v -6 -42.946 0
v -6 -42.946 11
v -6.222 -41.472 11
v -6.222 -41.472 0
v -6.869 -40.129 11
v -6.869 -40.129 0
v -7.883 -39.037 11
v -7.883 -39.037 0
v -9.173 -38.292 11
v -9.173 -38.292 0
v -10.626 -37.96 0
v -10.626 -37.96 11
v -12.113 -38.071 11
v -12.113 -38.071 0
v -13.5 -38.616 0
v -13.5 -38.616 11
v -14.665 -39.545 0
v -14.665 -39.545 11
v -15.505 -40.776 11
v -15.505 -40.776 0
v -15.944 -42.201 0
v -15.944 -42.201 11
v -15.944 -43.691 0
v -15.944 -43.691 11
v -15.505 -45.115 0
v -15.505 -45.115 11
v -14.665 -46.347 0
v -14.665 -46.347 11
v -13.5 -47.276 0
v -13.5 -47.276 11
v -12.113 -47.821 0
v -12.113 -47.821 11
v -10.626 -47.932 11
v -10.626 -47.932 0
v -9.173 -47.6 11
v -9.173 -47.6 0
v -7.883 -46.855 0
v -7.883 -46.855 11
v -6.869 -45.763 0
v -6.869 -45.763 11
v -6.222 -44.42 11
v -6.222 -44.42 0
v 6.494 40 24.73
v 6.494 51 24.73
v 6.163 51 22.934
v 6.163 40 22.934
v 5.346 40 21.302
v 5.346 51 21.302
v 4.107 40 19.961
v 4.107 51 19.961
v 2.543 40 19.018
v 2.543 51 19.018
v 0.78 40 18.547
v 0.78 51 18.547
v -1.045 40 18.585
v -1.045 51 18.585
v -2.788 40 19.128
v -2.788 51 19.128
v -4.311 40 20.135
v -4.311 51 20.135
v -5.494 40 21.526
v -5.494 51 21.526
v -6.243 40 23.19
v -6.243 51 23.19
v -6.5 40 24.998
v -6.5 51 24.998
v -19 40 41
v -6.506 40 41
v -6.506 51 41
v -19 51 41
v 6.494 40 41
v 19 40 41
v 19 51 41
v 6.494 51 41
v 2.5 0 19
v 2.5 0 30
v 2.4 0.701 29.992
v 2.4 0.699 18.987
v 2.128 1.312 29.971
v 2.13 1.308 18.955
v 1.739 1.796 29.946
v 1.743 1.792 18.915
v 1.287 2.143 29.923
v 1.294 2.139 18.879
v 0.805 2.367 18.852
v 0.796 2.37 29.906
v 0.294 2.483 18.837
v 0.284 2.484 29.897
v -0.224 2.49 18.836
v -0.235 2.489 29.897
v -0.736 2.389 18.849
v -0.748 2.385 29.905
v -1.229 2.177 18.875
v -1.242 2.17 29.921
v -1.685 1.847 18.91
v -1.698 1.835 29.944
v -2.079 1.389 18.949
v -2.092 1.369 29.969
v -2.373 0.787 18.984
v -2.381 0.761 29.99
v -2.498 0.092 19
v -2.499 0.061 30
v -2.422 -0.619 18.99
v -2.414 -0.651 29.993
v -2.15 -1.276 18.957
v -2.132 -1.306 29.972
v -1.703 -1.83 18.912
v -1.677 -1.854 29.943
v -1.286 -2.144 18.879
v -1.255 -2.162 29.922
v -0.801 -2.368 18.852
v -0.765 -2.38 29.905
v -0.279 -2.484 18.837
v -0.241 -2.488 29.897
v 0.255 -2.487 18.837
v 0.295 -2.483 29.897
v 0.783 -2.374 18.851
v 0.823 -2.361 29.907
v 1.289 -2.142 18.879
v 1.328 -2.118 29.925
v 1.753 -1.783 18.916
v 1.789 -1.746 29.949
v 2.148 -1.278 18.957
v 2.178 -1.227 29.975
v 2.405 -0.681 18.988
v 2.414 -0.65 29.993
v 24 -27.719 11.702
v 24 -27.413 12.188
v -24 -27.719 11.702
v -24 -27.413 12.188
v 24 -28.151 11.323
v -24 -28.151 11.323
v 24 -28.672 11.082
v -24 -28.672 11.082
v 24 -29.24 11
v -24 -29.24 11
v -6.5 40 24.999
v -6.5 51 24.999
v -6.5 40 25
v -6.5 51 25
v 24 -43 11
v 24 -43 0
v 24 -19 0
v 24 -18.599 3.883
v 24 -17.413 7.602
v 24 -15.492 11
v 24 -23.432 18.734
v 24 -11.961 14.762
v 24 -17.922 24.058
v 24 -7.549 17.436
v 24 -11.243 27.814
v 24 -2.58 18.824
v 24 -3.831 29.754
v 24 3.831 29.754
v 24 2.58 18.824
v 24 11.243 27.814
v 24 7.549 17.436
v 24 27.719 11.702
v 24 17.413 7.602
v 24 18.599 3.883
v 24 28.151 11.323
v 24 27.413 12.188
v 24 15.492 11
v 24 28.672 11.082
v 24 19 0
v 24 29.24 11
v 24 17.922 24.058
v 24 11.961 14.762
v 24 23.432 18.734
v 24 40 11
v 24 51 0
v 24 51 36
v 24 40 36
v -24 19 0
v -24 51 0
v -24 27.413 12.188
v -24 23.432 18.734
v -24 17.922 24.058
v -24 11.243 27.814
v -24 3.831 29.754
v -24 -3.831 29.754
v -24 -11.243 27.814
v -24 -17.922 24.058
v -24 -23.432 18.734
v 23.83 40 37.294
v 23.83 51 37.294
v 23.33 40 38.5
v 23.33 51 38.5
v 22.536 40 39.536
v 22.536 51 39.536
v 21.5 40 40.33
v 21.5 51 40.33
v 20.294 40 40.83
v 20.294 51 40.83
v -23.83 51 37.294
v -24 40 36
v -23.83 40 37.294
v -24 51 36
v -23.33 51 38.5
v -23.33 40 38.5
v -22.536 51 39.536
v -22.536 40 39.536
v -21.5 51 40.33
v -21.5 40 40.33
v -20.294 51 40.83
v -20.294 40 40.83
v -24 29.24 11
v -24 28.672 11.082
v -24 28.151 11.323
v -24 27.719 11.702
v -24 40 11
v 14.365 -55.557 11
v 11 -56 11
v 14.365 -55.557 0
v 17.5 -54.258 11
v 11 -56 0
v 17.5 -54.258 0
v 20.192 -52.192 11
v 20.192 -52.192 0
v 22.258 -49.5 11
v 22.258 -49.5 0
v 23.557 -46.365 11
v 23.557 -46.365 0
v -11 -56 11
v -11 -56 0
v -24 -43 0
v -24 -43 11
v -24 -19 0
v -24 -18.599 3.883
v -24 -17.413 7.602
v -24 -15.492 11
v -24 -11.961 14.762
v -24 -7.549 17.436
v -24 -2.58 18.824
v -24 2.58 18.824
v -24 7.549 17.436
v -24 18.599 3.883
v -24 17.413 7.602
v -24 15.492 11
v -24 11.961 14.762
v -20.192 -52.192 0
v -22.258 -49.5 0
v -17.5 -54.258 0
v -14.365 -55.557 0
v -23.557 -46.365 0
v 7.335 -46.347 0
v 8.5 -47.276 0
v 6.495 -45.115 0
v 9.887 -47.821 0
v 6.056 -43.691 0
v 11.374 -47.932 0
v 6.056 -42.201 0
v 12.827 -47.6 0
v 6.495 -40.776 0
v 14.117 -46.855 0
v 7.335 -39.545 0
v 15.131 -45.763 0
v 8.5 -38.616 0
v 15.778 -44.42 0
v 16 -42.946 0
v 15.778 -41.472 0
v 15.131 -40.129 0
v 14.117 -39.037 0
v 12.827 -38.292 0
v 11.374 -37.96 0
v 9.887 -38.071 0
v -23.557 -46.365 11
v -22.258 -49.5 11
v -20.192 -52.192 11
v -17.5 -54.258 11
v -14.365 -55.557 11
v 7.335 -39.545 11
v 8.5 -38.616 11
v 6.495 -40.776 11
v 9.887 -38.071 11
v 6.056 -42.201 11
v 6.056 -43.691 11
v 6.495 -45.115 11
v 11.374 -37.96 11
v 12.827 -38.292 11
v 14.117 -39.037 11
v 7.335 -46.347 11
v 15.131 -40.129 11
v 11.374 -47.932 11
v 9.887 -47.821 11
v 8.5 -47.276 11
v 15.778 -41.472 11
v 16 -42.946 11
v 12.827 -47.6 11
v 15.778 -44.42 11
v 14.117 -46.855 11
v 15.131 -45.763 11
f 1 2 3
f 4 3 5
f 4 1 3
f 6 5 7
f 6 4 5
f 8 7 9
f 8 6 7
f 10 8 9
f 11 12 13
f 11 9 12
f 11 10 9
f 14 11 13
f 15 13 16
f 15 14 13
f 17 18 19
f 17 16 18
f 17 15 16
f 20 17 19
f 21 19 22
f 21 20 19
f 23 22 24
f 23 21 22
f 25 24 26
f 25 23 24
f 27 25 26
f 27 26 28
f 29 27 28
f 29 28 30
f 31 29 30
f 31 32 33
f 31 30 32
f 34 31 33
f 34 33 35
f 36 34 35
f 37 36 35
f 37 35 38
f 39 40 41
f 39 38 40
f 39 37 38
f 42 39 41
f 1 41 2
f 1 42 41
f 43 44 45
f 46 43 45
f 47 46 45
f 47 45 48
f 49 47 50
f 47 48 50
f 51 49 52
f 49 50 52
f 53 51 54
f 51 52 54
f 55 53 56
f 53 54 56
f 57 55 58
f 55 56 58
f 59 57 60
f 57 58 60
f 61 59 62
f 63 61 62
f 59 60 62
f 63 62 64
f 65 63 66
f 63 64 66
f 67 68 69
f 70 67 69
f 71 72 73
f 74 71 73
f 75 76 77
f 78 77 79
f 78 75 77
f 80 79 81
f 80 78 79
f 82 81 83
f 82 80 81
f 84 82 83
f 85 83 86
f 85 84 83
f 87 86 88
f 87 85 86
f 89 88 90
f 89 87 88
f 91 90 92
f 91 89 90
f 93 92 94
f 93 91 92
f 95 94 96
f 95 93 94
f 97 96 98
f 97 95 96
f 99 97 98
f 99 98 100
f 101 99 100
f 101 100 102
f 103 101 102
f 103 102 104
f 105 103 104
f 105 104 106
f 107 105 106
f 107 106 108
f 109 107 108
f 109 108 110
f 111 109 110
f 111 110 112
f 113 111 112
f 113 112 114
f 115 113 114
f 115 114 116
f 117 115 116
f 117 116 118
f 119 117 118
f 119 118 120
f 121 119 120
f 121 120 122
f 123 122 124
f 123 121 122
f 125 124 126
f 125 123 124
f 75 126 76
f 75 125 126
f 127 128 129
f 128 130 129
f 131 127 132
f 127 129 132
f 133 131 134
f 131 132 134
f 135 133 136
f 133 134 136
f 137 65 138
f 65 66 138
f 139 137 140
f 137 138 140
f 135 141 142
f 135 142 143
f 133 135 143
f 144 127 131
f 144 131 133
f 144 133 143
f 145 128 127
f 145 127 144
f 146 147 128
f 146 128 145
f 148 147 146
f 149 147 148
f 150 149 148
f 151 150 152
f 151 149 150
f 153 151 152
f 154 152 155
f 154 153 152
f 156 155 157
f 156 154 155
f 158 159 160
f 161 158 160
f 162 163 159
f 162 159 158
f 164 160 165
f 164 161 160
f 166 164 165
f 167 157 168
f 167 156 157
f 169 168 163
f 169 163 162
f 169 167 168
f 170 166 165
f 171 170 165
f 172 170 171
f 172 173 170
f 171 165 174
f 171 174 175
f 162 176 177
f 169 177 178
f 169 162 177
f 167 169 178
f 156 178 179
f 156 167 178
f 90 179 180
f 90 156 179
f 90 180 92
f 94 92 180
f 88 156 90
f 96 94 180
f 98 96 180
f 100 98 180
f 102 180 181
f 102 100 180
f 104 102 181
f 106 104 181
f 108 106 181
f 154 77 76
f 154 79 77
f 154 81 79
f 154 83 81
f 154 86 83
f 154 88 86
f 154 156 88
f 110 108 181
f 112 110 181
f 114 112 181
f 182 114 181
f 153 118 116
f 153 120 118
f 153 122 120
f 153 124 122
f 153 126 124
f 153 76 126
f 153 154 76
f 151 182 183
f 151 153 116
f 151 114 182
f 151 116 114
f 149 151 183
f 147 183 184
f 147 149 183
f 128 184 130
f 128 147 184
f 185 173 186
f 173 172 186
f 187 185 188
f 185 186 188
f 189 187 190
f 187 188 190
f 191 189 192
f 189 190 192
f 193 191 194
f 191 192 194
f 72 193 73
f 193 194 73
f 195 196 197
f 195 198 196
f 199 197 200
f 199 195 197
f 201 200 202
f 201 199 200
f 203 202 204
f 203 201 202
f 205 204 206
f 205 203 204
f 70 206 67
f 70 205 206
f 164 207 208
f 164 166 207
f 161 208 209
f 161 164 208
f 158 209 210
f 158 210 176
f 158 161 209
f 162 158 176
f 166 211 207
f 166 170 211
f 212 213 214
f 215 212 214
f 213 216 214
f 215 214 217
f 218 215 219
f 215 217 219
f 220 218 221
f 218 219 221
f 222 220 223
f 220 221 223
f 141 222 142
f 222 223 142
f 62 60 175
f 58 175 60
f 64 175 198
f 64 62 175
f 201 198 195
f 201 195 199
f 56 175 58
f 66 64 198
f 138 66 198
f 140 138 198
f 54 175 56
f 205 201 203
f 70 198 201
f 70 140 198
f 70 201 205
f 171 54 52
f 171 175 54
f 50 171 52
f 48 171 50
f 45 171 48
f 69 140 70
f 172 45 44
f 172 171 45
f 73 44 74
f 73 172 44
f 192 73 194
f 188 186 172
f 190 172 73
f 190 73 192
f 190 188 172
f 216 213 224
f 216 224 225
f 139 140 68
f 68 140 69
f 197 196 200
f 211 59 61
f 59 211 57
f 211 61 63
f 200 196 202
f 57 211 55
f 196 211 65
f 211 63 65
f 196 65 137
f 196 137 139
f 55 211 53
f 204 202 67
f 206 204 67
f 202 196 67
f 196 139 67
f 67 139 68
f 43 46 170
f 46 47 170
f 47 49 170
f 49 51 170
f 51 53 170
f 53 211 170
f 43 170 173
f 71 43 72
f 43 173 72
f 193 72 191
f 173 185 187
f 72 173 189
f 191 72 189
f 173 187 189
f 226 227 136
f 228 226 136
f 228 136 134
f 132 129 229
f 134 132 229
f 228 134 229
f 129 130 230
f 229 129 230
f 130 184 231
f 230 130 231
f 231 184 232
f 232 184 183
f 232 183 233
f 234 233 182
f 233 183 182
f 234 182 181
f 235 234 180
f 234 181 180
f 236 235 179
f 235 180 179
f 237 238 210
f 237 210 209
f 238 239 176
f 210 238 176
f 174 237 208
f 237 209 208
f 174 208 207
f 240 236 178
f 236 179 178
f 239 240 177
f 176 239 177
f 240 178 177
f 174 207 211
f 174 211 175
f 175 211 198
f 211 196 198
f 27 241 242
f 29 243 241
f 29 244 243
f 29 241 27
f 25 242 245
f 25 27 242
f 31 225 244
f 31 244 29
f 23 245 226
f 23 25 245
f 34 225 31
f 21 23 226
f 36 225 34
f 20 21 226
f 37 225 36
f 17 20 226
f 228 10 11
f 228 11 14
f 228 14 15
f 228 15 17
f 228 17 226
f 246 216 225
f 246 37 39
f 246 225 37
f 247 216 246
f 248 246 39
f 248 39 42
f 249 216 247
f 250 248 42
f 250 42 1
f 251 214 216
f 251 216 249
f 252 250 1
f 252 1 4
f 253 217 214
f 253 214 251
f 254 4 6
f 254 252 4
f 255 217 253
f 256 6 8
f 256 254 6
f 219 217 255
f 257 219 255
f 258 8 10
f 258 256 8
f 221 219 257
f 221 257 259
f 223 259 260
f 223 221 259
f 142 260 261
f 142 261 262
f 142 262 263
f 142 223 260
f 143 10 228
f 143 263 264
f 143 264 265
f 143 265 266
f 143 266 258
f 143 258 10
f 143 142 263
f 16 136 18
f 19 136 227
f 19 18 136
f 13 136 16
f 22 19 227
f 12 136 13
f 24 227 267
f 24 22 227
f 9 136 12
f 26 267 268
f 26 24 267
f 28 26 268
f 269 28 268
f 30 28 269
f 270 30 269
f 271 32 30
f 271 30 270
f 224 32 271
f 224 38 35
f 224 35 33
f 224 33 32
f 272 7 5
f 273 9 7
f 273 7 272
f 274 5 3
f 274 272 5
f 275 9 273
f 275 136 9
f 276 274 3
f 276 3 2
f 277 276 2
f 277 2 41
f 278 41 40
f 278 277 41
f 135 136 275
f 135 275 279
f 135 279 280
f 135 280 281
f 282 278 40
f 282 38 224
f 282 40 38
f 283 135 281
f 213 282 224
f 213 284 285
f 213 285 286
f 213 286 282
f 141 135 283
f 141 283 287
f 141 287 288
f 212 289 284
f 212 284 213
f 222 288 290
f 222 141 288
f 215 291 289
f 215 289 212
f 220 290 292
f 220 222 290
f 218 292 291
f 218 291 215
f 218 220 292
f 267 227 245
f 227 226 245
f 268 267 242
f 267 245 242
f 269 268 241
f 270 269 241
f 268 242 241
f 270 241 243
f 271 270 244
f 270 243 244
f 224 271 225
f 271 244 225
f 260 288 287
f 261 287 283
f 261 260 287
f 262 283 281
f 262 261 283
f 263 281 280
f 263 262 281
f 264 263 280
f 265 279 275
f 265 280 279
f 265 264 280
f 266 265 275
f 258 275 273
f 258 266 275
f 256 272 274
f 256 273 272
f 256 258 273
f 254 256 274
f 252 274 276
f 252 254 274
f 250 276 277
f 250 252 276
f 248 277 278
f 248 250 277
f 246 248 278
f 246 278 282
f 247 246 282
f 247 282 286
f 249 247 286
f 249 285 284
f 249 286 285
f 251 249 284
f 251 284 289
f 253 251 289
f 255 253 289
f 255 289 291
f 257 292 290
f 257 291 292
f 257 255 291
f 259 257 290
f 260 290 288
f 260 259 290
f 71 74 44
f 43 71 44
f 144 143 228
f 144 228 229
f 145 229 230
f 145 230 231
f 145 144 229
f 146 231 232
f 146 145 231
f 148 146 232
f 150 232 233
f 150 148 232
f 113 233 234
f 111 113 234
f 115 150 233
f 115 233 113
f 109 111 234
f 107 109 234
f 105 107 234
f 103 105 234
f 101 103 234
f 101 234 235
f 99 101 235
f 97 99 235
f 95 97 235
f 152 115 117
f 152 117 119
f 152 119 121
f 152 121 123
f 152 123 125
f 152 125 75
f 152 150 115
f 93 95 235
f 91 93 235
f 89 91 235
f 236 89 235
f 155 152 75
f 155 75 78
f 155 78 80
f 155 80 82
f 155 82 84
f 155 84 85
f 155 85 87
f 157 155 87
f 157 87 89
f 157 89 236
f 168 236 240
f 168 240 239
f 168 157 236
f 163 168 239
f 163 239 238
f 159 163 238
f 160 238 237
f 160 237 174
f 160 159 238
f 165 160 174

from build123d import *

# Parameters (mm, degrees)
F0_W     = 11
F0_H     = 30
F1_DEPTH = 24
F3_DEPTH = 11
F4_R     = 5
F4_R_2   = 2.5
F5_DEPTH = 41.001
F6_R     = 13
F7_R     = 5
F8_R     = 2


# Not quite as in the source:
# - ends of sketch curves that miss each other by under 0.0002 mm in the source are joined


with BuildPart() as f1:
    # F0 (on Right) → F1 (new body, symmetric)
    with BuildSketch(Plane.YZ):
        with BuildLine():
            Line((-56, 0), (-30, 0))
            ThreePointArc((-30, 0), (-29.4730143031, 5.5983415304), (-27.9105714739, 11))
            Line((-27.9105714739, 11), (-56, 11))
            Line((-56, 11), (-56, 0))
        make_face()
        with BuildLine():
            Line((-30, 0), (-19, 0))
            ThreePointArc((-19, 0), (-18.1017503893, 5.7729223833), (-15.4919333848, 11))
            Line((-15.4919333848, 11), (-27.9105714739, 11))
            ThreePointArc((-27.9105714739, 11), (-29.4730143031, 5.5983415304), (-30, 0))
        make_face()
        with BuildLine():
            ThreePointArc((-15.4919333848, 11), (0, 19), (15.4919333848, 11))
            Line((15.4919333848, 11), (27.9105714739, 11))
            ThreePointArc((27.9105714739, 11), (0, 30), (-27.9105714739, 11))
            Line((-27.9105714739, 11), (-15.4919333848, 11))
        make_face()
        with BuildLine():
            ThreePointArc((15.4919333848, 11), (18.1017503893, 5.7729223833), (19, 0))
            Line((19, 0), (30, 0))
            ThreePointArc((30, 0), (29.4730143031, 5.5983415304), (27.9105714739, 11))
            Line((27.9105714739, 11), (15.4919333848, 11))
        make_face()
        with BuildLine():
            ThreePointArc((27.9105714739, 11), (29.4730143031, 5.5983415304), (30, 0))
            Line((30, 0), (51, 0))
            Line((51, 0), (51, 11))
            Line((51, 11), (40, 11))
            Line((40, 11), (27.9105714739, 11))
        make_face()
        with Locations((45.5, 26)):
            Rectangle(F0_W, F0_H)
    extrude(amount=F1_DEPTH, both=True)

    # F2 (on face) → F3 (cut, through all)
    with BuildSketch(Plane(origin=(0, 51, 0), x_dir=(-1, 0, 0), z_dir=(0, 1, 0))):
        with BuildLine():
            Line((-6.4943742253, 25.2703764435), (-6.4943742253, 24.7296235565))
            ThreePointArc((-6.4943742253, 24.7296235565), (0.1340750741, 18.501382926), (6.4999995983, 24.9977146924))
            ThreePointArc((6.4999995983, 24.9977146924), (6.4999998996, 24.9988573462), (6.5, 25))
            ThreePointArc((6.5, 25), (0.1352174827, 31.4985934041), (-6.4943742253, 25.2703764435))
        make_face()
        with BuildLine():
            Line((-6.4943742253, 41), (-6.4943742253, 25.2703764435))
            ThreePointArc((-6.4943742253, 25.2703764435), (0.1352174827, 31.4985934041), (6.5, 25))
            Line((6.5, 25), (6.5056257747, 41))
            Line((6.5056257747, 41), (-6.4943742253, 41))
        make_face()
    extrude(amount=-F3_DEPTH, mode=Mode.SUBTRACT)

    # F4 (on Top) → F5 (cut, through all)
    with BuildSketch(Plane.XY):
        with Locations((11, -42.9459065199)):
            Circle(F4_R)
        with Locations((-11, -42.9459065199)):
            Circle(F4_R)
        Circle(F4_R_2)
    extrude(amount=F5_DEPTH, mode=Mode.SUBTRACT)

    # F6
    f6_edges = [f1.edges().sort_by_distance(p)[0] for p in [
        (-24, -56, 5.5),
        (24, -56, 5.5),
    ]]
    fillet(f6_edges, radius=F6_R)

    # F7
    f7_edges = [f1.edges().sort_by_distance(p)[0] for p in [
        (-24, 45.5, 41),
        (24, 45.5, 41),
    ]]
    fillet(f7_edges, radius=F7_R)

    # F8
    f8_edges = [f1.edges().sort_by_distance(p)[0] for p in [
        (0, -27.910571, 11),
        (0, 27.910571, 11),
    ]]
    fillet(f8_edges, radius=F8_R)


solid = f1.part
